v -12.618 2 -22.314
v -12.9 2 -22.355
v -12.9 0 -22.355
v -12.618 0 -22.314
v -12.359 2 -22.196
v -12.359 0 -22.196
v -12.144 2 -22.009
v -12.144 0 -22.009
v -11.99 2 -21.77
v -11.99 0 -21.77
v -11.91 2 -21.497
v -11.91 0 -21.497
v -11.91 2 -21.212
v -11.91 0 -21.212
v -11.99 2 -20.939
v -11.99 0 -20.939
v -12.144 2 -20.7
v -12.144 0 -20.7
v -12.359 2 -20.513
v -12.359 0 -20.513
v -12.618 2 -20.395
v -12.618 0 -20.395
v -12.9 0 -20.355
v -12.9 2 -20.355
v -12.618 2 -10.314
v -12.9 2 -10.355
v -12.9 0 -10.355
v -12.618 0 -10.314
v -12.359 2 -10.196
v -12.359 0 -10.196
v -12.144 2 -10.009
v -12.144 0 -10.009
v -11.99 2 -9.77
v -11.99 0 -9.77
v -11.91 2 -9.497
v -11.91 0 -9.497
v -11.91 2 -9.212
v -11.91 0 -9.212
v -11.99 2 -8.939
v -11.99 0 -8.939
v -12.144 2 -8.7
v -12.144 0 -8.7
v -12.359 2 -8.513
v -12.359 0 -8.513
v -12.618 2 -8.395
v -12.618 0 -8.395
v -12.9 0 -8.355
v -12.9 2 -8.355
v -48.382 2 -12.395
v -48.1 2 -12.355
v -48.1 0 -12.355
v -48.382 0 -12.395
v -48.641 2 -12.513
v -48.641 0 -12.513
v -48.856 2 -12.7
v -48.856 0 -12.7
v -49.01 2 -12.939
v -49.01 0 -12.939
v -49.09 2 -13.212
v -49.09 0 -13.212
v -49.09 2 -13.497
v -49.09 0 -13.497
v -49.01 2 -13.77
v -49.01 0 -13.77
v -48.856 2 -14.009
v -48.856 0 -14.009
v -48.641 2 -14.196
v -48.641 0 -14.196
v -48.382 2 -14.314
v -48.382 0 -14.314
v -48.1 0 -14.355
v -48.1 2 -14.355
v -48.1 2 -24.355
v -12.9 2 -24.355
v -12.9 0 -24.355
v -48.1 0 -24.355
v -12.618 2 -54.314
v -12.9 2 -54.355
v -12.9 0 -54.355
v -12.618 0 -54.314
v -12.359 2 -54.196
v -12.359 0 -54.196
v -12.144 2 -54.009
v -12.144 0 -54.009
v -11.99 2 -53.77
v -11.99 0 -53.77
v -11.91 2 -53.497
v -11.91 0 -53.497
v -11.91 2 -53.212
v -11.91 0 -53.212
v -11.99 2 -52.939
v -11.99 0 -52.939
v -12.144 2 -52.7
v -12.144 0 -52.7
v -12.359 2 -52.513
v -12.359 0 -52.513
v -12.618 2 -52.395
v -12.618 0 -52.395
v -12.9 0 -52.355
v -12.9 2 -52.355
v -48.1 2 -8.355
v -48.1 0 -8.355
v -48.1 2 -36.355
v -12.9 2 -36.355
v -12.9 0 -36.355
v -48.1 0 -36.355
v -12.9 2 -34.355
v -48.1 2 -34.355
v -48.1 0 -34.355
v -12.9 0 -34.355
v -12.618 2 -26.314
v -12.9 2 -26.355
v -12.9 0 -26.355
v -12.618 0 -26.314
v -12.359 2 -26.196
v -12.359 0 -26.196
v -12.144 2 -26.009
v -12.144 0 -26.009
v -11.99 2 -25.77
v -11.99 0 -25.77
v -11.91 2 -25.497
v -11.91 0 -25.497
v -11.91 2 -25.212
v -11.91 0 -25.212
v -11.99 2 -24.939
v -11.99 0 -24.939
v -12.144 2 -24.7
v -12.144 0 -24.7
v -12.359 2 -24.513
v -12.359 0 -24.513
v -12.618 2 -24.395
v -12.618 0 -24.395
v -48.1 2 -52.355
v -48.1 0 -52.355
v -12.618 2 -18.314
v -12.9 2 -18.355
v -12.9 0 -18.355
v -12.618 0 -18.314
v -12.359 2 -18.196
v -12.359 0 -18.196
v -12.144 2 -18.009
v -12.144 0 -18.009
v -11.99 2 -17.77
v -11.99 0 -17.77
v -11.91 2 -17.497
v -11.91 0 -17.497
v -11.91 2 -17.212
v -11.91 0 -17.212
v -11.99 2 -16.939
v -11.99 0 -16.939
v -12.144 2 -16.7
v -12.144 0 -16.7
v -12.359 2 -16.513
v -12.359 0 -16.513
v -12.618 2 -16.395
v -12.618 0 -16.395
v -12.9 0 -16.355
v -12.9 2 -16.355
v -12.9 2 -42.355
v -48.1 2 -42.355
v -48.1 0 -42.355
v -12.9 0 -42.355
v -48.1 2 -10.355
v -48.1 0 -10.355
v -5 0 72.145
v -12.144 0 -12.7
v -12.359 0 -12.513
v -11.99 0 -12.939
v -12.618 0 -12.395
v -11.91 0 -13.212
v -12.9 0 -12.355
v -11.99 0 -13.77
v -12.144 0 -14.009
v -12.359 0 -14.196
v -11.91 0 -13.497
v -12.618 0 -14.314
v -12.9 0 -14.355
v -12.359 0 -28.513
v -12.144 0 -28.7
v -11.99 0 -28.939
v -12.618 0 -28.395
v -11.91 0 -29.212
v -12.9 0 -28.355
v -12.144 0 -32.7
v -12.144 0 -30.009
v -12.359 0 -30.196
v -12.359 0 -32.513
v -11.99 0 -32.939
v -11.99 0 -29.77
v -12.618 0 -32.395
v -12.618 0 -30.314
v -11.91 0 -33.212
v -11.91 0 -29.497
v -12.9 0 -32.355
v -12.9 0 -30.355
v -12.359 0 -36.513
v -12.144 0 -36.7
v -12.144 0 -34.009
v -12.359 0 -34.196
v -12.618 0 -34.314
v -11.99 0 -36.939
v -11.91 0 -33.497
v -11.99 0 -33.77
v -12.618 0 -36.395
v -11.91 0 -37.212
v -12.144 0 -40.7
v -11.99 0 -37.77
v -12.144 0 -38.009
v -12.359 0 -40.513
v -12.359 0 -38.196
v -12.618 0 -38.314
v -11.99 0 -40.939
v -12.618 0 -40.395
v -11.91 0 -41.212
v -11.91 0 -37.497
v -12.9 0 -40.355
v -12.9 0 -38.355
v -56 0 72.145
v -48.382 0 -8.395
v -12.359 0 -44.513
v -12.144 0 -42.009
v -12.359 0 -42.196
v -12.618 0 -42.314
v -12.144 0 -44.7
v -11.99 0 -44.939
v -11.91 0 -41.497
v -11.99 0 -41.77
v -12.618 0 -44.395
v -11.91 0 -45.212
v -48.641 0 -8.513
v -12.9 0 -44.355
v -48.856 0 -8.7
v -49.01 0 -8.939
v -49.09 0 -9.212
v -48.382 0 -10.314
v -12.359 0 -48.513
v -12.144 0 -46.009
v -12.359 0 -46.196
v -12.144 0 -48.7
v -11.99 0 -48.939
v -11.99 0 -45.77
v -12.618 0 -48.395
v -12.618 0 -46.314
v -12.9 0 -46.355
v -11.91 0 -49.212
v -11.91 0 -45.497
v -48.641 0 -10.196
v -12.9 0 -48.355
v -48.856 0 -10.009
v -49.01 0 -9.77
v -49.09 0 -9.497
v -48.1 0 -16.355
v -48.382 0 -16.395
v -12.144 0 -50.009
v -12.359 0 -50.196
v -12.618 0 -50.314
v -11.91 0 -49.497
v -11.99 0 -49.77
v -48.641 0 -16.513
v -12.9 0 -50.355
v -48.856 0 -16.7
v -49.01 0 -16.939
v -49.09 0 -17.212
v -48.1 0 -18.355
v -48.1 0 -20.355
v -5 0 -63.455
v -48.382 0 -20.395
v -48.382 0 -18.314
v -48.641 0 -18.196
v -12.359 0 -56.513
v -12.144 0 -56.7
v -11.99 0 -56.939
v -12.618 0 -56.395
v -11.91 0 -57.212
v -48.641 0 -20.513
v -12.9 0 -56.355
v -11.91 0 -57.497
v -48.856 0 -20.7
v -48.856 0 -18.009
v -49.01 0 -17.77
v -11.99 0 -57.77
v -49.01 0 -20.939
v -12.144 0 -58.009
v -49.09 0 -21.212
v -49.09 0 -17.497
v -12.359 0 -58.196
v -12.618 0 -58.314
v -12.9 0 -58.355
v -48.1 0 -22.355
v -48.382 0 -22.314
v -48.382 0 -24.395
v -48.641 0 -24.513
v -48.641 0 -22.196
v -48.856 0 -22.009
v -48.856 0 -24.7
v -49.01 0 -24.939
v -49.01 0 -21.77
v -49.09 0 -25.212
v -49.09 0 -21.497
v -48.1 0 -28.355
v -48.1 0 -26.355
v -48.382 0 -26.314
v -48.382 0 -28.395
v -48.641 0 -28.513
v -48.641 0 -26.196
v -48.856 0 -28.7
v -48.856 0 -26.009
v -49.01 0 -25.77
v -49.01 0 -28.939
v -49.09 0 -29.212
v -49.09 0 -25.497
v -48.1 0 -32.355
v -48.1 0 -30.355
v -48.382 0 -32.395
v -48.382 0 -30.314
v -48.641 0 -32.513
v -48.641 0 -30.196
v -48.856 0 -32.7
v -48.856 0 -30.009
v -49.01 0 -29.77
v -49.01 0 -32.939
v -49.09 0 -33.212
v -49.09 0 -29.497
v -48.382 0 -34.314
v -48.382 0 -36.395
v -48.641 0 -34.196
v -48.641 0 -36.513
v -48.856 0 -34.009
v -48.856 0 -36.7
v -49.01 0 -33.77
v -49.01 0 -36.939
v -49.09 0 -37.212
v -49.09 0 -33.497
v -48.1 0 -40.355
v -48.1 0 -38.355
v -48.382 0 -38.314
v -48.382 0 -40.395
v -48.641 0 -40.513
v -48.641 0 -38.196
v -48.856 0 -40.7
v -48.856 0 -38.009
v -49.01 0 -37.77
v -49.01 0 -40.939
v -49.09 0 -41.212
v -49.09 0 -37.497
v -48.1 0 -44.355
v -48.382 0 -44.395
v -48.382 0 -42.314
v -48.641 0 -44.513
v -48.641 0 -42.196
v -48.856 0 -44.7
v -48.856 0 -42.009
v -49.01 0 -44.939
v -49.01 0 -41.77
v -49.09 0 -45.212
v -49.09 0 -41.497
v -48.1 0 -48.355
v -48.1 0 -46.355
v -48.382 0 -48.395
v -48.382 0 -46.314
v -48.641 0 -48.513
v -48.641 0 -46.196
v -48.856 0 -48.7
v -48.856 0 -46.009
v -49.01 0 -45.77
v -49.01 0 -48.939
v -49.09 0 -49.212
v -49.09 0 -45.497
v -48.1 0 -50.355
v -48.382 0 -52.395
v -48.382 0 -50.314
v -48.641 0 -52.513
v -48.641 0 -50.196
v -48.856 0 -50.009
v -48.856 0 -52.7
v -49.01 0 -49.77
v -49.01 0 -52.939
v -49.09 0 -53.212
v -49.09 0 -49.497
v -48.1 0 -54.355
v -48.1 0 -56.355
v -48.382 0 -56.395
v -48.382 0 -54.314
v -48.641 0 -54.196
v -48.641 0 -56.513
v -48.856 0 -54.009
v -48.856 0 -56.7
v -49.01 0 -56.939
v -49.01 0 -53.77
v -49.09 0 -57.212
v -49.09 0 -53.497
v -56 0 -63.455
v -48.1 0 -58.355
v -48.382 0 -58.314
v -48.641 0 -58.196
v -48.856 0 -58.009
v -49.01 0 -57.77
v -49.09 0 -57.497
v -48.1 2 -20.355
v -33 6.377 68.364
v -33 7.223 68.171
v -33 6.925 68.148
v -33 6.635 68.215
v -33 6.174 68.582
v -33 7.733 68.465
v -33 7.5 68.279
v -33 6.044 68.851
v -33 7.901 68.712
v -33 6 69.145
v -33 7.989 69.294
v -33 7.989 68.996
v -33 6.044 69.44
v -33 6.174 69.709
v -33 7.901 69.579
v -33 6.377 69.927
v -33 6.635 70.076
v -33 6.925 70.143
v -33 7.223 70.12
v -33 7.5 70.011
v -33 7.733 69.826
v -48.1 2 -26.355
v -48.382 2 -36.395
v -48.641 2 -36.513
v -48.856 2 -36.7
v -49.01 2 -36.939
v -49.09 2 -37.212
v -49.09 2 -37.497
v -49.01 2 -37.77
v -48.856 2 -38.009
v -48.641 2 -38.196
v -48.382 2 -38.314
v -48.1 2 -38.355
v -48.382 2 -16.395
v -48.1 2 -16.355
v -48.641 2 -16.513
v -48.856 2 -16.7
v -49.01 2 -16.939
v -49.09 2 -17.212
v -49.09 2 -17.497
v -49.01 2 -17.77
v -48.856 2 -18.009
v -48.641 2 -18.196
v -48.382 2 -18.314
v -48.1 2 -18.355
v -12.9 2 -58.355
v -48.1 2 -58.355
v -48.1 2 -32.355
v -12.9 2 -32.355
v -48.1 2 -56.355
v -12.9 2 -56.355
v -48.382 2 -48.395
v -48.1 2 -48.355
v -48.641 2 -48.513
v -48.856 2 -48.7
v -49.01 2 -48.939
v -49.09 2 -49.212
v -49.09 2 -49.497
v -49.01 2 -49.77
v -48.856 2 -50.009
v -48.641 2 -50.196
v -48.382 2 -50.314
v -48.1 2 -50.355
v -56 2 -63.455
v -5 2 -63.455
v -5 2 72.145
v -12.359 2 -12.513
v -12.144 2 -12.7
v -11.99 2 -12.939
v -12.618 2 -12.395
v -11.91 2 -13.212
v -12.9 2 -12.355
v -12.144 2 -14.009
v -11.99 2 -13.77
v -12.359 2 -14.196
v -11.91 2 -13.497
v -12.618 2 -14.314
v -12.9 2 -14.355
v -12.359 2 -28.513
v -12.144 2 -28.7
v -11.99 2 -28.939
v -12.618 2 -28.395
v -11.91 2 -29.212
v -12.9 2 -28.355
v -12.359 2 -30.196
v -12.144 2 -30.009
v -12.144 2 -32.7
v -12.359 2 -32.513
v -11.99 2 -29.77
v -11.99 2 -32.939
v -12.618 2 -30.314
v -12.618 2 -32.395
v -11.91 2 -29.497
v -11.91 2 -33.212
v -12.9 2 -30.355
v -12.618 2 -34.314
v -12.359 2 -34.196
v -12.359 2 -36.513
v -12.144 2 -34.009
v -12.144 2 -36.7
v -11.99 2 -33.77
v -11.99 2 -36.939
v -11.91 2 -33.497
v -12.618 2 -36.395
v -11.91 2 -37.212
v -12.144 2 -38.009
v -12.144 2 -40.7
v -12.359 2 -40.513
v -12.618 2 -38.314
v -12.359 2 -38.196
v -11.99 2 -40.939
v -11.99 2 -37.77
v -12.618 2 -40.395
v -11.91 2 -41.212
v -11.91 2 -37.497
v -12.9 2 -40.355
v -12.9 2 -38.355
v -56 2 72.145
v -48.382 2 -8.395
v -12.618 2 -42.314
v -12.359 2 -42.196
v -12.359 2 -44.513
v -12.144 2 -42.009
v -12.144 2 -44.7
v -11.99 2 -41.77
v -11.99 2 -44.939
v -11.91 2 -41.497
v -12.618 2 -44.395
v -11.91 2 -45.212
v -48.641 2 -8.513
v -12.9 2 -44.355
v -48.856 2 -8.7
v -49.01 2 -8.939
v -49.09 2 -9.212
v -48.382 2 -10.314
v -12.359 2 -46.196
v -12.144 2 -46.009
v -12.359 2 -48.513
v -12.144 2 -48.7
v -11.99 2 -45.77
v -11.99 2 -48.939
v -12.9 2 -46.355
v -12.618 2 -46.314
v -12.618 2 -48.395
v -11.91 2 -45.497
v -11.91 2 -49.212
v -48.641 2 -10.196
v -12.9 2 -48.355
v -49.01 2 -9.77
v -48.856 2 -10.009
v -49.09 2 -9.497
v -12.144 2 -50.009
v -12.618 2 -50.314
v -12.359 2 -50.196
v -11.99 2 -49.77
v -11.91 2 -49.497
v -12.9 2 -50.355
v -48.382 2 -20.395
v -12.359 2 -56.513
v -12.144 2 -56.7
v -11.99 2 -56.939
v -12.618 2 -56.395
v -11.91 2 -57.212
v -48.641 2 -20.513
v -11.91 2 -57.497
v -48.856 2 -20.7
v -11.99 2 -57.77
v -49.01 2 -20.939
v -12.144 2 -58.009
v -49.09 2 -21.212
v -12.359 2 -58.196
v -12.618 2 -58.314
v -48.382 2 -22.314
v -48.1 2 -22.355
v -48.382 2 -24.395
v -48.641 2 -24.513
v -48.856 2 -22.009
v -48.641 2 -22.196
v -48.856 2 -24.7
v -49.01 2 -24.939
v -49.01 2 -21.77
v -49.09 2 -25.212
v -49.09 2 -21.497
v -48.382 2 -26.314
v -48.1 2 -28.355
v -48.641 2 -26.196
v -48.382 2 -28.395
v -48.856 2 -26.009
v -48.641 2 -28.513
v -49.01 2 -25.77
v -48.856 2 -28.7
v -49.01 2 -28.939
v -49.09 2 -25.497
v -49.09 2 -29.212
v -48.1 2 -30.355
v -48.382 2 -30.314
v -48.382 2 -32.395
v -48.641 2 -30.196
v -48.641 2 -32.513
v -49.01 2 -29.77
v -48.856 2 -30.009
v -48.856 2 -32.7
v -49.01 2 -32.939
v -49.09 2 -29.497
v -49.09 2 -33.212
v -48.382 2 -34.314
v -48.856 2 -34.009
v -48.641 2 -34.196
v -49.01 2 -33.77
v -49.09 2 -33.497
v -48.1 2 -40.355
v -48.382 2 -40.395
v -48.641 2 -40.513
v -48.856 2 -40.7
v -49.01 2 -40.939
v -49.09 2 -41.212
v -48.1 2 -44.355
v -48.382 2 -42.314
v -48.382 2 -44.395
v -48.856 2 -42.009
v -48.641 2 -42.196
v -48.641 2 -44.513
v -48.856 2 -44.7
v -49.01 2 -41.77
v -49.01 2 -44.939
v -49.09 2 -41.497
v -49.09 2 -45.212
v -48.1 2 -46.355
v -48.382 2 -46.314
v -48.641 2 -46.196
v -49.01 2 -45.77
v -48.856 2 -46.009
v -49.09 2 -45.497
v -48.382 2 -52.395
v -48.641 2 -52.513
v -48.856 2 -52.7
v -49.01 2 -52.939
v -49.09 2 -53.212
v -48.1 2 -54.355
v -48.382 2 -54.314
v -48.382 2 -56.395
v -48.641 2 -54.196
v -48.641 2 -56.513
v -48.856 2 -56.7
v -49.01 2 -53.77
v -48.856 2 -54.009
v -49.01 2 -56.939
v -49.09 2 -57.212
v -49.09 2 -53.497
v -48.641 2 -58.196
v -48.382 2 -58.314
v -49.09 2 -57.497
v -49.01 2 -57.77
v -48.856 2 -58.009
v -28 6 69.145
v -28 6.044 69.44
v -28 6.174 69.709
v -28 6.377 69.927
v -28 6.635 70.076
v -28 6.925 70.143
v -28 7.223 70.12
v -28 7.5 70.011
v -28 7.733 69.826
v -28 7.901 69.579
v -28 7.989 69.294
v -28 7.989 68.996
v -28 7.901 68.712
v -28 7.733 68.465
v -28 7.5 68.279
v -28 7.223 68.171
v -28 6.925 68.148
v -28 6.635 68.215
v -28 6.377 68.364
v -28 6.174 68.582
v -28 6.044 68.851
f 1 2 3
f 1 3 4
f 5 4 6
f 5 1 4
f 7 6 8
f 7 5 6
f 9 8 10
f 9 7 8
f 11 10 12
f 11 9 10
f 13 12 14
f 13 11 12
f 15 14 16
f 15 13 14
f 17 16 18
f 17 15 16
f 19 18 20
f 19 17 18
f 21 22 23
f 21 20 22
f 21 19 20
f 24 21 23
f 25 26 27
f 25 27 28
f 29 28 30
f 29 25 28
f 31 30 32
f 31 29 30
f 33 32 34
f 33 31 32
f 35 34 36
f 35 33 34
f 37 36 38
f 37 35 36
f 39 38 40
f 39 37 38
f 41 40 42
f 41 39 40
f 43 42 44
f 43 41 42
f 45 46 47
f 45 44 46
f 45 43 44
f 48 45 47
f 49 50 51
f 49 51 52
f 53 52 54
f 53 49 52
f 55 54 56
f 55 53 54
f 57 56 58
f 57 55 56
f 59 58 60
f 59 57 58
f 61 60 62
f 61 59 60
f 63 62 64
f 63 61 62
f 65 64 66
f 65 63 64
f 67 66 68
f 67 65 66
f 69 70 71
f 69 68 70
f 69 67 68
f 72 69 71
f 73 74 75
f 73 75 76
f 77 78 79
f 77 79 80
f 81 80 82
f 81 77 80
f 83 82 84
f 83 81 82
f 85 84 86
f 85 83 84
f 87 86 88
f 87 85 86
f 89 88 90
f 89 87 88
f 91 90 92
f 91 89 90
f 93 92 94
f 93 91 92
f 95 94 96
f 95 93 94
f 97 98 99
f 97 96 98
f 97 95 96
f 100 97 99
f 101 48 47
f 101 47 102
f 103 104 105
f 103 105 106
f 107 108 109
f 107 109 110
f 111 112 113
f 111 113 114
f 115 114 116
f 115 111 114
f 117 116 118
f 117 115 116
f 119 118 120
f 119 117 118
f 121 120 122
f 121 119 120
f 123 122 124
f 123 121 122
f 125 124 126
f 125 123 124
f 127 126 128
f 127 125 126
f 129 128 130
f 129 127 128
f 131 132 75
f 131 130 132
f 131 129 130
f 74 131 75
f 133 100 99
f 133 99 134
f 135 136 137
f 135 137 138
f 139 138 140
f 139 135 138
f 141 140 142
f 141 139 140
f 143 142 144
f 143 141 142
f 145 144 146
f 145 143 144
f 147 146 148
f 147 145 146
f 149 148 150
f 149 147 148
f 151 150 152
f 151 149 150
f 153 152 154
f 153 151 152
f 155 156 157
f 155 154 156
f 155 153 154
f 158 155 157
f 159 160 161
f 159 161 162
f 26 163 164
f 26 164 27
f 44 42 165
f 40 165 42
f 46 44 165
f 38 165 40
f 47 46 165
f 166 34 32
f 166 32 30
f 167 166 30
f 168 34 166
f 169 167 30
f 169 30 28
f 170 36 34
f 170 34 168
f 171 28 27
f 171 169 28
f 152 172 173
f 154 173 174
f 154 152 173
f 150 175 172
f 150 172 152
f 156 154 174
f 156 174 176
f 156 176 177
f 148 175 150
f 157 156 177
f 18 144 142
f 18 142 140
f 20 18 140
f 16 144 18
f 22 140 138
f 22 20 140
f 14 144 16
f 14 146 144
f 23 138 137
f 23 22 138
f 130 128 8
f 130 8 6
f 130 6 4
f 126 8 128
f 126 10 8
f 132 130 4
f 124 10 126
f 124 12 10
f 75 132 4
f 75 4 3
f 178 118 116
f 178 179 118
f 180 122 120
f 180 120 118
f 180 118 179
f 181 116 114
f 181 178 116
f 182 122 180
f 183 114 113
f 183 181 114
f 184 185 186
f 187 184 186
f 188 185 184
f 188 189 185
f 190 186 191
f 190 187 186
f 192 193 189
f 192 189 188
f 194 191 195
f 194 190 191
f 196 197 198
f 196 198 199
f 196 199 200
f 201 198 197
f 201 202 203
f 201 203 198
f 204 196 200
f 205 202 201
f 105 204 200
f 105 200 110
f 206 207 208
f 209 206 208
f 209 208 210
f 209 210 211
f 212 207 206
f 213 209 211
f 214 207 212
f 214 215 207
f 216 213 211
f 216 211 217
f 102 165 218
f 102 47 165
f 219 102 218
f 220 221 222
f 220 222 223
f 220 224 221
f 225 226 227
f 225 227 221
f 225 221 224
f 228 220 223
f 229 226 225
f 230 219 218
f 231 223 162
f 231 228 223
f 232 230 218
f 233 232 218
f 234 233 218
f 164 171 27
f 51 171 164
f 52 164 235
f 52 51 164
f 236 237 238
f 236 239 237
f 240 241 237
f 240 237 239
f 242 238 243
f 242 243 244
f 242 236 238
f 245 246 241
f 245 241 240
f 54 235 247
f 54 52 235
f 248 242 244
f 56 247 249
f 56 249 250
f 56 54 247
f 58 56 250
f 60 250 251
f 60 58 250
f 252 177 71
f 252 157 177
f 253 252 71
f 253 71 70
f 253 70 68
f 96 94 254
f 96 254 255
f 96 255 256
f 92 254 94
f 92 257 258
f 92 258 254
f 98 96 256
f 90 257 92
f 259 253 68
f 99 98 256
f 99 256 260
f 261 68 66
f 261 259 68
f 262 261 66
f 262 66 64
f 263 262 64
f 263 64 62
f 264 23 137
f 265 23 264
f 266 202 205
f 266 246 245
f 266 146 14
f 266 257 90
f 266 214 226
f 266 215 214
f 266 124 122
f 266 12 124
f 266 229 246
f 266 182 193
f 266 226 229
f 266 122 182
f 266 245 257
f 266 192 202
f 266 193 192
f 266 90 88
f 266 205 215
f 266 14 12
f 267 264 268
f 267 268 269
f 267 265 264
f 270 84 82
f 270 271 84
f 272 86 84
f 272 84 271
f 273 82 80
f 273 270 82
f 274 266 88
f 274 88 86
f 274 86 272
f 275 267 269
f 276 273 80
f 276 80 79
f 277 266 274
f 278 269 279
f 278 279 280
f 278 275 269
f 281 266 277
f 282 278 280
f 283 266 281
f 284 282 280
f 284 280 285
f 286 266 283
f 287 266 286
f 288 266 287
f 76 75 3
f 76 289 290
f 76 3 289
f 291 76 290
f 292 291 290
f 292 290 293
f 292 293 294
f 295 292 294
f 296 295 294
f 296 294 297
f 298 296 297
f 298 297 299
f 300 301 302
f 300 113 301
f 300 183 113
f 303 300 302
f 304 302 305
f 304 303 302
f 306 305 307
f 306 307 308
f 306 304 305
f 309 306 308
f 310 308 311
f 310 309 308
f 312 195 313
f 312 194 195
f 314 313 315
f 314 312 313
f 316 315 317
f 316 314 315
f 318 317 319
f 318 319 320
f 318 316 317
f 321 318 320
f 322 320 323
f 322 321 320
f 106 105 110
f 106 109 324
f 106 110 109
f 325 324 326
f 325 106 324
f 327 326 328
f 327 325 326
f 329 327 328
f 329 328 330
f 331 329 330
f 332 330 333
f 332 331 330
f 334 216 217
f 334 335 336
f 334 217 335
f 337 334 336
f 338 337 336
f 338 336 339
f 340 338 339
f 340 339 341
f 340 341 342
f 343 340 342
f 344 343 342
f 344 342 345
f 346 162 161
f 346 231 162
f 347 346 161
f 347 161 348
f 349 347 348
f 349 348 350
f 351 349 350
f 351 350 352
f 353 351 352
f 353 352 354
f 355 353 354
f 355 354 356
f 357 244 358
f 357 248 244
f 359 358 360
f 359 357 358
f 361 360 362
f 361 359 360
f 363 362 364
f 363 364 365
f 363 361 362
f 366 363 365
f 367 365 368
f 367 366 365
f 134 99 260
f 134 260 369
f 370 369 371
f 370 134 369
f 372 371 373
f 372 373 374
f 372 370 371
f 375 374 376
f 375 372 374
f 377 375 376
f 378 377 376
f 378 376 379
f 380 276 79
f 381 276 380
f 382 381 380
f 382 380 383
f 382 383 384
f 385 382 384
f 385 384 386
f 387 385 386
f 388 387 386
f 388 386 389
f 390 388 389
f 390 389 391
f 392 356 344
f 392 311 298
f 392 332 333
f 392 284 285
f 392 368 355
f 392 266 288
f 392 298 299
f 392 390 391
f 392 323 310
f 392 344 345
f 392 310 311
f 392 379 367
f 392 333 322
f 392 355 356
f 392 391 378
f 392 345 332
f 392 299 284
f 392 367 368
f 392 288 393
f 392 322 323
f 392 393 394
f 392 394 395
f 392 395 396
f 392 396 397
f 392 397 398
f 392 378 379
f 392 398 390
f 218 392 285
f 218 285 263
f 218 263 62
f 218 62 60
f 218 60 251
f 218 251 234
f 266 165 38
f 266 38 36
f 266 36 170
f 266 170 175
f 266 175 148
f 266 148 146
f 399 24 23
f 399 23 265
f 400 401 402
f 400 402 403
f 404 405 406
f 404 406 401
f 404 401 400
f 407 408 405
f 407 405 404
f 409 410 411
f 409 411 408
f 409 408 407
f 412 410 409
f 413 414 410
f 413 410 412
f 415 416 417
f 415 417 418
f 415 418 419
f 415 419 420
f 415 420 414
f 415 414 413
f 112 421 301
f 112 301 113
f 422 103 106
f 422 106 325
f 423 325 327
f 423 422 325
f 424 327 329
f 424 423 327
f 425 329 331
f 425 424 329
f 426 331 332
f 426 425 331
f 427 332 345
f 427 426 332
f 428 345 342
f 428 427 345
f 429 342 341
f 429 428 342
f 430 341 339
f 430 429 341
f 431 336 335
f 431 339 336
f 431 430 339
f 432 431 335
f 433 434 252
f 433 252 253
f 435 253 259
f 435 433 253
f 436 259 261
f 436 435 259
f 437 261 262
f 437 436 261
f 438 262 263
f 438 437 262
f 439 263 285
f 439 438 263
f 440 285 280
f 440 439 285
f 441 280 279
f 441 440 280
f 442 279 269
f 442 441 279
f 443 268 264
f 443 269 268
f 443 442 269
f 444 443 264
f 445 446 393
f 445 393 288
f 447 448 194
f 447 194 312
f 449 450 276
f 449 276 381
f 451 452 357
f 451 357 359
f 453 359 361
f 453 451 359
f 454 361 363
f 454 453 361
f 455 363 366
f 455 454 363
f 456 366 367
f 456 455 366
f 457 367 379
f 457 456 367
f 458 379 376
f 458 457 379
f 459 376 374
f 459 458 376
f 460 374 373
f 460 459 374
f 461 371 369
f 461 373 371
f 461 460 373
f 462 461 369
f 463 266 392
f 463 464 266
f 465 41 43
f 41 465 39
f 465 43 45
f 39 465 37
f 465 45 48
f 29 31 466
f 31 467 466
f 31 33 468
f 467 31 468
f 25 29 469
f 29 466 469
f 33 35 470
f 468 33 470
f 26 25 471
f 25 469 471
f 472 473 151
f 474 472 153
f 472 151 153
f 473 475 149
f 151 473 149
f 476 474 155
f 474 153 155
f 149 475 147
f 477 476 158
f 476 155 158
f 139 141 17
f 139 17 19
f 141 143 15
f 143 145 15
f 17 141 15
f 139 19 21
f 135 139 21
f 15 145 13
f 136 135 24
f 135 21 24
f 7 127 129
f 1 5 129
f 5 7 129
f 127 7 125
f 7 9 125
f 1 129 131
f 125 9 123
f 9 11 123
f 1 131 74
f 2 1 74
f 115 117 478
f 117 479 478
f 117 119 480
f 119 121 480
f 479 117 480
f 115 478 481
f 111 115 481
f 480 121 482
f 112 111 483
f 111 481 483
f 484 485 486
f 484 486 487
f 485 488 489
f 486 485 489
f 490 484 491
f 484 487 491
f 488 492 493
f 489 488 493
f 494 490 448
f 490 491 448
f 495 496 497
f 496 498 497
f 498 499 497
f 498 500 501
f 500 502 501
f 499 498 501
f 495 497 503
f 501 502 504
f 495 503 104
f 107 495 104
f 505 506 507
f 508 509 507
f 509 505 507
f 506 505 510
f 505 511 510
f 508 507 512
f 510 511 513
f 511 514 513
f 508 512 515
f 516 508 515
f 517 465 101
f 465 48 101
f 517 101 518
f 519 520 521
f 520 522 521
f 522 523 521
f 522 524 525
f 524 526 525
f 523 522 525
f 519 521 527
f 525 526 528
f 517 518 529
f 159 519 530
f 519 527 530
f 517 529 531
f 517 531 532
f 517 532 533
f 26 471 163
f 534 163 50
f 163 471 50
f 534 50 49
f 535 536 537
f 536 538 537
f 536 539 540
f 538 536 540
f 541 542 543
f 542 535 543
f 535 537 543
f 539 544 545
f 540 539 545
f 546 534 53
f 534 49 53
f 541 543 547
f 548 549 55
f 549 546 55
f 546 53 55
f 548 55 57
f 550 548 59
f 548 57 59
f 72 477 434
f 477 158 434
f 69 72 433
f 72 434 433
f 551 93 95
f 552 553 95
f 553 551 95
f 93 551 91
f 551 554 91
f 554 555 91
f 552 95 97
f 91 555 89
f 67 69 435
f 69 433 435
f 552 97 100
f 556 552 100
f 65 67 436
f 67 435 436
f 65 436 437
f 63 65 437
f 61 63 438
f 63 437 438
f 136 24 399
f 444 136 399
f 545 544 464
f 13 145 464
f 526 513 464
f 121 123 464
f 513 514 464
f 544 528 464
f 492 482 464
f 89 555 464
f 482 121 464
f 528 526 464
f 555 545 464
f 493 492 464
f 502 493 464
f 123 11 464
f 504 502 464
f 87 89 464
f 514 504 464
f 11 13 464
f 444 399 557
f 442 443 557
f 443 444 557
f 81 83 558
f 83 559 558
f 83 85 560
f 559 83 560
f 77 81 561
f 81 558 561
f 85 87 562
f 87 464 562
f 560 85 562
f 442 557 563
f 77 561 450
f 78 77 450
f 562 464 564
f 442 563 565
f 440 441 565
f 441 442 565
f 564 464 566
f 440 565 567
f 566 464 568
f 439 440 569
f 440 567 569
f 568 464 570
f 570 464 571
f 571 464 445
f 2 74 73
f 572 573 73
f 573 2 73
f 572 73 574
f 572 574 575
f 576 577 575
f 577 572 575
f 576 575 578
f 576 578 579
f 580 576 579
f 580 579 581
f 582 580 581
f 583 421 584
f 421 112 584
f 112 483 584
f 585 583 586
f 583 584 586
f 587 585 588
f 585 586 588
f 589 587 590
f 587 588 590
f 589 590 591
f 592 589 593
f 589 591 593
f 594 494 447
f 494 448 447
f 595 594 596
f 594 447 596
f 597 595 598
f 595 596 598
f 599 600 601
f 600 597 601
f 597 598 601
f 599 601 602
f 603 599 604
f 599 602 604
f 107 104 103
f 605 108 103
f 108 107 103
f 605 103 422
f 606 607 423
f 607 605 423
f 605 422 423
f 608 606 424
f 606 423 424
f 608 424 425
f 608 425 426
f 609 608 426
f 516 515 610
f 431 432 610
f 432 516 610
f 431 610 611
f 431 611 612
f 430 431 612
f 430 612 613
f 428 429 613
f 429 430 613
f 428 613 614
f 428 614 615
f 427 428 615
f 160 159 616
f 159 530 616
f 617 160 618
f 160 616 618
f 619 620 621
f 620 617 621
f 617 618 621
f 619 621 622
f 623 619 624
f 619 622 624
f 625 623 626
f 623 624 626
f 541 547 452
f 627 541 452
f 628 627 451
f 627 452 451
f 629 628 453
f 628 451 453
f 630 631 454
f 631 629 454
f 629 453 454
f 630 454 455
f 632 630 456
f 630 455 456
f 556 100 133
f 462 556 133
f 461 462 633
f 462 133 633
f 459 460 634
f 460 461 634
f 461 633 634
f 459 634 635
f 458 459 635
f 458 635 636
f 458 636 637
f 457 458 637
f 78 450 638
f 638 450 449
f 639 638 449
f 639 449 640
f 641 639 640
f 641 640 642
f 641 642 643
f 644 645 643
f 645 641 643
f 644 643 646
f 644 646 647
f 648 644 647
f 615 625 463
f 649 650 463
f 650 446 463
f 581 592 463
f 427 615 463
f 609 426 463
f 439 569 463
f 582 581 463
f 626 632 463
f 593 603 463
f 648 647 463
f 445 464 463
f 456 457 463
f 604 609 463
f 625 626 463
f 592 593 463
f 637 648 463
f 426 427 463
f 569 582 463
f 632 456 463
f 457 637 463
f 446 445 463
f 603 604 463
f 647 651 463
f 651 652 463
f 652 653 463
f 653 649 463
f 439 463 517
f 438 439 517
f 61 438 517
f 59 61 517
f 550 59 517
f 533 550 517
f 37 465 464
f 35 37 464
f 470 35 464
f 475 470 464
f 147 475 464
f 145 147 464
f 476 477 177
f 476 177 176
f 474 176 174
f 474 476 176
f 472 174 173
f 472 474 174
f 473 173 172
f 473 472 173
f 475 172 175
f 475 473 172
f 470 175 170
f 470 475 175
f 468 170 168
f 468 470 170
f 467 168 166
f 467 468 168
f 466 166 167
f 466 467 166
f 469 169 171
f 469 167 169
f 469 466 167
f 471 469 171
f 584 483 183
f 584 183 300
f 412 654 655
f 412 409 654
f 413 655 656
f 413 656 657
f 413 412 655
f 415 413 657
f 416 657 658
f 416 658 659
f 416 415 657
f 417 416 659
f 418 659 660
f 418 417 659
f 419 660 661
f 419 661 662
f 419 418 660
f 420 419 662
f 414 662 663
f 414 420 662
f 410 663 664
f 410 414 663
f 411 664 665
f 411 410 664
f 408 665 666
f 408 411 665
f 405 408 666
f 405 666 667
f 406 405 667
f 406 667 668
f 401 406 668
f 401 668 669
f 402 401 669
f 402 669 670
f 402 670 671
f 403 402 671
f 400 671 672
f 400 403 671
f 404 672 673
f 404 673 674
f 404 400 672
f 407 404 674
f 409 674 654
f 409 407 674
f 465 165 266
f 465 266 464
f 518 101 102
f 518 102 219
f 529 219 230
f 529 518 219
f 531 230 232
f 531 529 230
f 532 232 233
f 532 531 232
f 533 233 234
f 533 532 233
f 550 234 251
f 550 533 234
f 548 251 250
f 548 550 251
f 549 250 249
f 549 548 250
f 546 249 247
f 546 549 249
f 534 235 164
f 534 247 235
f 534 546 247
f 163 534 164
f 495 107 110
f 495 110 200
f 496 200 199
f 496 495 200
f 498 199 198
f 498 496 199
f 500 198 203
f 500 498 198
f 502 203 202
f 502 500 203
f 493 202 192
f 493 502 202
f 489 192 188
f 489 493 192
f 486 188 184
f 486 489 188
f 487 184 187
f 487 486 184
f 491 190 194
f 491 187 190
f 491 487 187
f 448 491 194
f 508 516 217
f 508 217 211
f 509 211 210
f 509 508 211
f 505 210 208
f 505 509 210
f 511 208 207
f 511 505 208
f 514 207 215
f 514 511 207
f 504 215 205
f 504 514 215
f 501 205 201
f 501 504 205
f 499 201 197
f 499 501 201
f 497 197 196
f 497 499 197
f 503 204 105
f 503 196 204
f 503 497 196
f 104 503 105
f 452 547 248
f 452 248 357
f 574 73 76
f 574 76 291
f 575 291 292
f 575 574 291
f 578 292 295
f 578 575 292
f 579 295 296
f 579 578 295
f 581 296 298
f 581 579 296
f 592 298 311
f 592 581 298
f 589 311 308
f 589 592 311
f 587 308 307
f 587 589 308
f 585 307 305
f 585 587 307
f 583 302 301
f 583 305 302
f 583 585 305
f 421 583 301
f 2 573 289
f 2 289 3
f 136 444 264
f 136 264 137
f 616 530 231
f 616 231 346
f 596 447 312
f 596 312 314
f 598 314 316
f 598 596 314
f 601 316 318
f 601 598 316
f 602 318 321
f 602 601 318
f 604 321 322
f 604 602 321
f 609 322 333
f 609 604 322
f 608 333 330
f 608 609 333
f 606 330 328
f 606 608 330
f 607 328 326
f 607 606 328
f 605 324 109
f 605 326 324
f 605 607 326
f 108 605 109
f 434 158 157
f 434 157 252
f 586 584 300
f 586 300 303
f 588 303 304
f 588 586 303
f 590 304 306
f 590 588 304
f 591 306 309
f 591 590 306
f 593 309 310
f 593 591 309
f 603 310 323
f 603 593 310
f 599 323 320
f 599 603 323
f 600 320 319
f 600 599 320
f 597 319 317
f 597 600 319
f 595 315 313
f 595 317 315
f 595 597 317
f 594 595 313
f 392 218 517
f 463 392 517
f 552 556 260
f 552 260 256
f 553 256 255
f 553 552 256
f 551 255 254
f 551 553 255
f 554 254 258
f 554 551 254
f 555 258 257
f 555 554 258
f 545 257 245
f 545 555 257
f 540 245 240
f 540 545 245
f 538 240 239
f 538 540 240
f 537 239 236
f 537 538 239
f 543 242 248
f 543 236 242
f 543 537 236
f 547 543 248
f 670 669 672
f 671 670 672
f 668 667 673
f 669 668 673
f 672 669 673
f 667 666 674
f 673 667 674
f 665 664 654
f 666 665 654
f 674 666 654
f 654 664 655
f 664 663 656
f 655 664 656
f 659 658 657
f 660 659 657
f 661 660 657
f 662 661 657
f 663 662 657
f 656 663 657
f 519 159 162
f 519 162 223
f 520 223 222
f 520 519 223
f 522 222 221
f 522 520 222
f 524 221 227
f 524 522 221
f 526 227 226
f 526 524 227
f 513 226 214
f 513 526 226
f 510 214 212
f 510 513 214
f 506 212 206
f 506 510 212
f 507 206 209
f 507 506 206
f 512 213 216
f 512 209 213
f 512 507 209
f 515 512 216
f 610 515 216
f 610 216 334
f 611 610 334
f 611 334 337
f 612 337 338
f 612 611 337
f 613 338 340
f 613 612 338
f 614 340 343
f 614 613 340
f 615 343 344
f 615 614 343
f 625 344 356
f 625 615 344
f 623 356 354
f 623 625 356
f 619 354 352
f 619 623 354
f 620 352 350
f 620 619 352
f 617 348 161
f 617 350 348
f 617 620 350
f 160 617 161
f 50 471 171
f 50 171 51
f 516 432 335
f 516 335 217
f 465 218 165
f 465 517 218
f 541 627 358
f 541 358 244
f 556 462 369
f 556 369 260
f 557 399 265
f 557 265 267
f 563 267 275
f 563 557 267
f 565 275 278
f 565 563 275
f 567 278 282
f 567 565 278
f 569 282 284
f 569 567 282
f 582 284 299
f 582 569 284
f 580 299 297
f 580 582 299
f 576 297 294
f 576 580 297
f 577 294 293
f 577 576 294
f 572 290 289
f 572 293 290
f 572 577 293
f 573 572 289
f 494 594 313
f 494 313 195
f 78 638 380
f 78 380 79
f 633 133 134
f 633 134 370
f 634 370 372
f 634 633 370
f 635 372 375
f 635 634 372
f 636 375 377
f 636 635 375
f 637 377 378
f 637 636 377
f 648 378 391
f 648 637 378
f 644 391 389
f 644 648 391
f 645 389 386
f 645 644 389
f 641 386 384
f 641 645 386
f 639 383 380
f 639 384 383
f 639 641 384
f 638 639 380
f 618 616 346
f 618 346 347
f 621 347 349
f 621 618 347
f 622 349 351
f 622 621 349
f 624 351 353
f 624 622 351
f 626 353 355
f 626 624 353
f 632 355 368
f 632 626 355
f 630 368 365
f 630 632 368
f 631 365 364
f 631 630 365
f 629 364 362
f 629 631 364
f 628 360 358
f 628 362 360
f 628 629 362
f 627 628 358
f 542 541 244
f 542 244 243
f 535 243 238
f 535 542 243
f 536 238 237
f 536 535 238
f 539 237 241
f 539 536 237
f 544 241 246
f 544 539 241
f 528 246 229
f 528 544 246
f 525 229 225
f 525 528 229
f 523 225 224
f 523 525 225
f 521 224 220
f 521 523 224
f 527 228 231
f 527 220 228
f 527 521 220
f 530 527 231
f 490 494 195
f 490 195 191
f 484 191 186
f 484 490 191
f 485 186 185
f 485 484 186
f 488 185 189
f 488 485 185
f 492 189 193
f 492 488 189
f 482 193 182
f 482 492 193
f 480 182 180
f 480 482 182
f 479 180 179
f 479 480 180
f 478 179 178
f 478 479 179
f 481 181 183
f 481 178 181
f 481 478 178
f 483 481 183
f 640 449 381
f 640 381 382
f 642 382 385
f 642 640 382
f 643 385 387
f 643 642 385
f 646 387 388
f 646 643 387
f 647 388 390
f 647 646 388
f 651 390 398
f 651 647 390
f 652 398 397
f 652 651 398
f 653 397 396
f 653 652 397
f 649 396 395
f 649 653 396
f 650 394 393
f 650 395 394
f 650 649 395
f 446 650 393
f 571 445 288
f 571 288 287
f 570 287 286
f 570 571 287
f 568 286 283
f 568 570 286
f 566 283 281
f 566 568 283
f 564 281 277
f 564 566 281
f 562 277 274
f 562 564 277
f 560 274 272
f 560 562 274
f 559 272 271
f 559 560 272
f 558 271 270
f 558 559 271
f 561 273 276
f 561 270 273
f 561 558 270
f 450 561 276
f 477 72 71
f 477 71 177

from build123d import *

# Parameters (mm, degrees)
SKETCH1_W           = 51
SKETCH1_H           = 136
BOSS_EXTRUDE1_DEPTH = 2
CUT_EXTRUDE1_DEPTH  = 10
SKETCH5_W           = 1
SKETCH5_H           = 2
BOSS_EXTRUDE2_DEPTH = 136
SKETCH6_W           = 1
SKETCH6_H           = 2
BOSS_EXTRUDE3_DEPTH = 136
SKETCH7_W           = 68.795835126
SKETCH7_H           = 26.425628728
CUT_EXTRUDE2_DEPTH  = 0.4
SKETCH8_W           = 2
SKETCH8_H           = 2
CUT_EXTRUDE3_DEPTH  = 135.6
SKETCH9_R           = 1
BOSS_EXTRUDE4_DEPTH = 2.5


with BuildPart() as part:
    # Sketch1 → Boss-Extrude1 (new body)
    with BuildSketch(Plane(origin=(0, 0, 0), x_dir=(1, 0, 0), z_dir=(0, 1, 0))):
        with Locations((-30.5, -4.545454545)):
            Rectangle(SKETCH1_W, SKETCH1_H)
    extrude(amount=BOSS_EXTRUDE1_DEPTH)

    # Sketch4 → Cut-Extrude1 (cut)
    with BuildSketch(Plane(origin=(0, 2, 0), x_dir=(1, 0, 0), z_dir=(0, 1, 0))):
        with BuildLine():
            Line((-48.1, 58.354545455), (-12.9, 58.354545455))
            ThreePointArc((-12.9, 58.354545455), (-11.9, 57.354545455), (-12.9, 56.354545455))
            Line((-12.9, 56.354545455), (-48.1, 56.354545455))
            ThreePointArc((-48.1, 56.354545455), (-49.1, 57.354545455), (-48.1, 58.354545455))
        make_face()
        with BuildLine():
            Line((-48.1, 54.354545455), (-12.9, 54.354545455))
            ThreePointArc((-12.9, 54.354545455), (-11.9, 53.354545455), (-12.9, 52.354545455))
            Line((-12.9, 52.354545455), (-48.1, 52.354545455))
            ThreePointArc((-48.1, 52.354545455), (-49.1, 53.354545455), (-48.1, 54.354545455))
        make_face()
        with BuildLine():
            Line((-48.1, 50.354545455), (-12.9, 50.354545455))
            ThreePointArc((-12.9, 50.354545455), (-11.9, 49.354545455), (-12.9, 48.354545455))
            Line((-12.9, 48.354545455), (-48.1, 48.354545455))
            ThreePointArc((-48.1, 48.354545455), (-49.1, 49.354545455), (-48.1, 50.354545455))
        make_face()
        with BuildLine():
            Line((-48.1, 46.354545455), (-12.9, 46.354545455))
            ThreePointArc((-12.9, 46.354545455), (-11.9, 45.354545455), (-12.9, 44.354545455))
            Line((-12.9, 44.354545455), (-48.1, 44.354545455))
            ThreePointArc((-48.1, 44.354545455), (-49.1, 45.354545455), (-48.1, 46.354545455))
        make_face()
        with BuildLine():
            Line((-48.1, 42.354545455), (-12.9, 42.354545455))
            ThreePointArc((-12.9, 42.354545455), (-11.9, 41.354545455), (-12.9, 40.354545455))
            Line((-12.9, 40.354545455), (-48.1, 40.354545455))
            ThreePointArc((-48.1, 40.354545455), (-49.1, 41.354545455), (-48.1, 42.354545455))
        make_face()
        with BuildLine():
            Line((-48.1, 38.354545455), (-12.9, 38.354545455))
            ThreePointArc((-12.9, 38.354545455), (-11.9, 37.354545455), (-12.9, 36.354545455))
            Line((-12.9, 36.354545455), (-48.1, 36.354545455))
            ThreePointArc((-48.1, 36.354545455), (-49.1, 37.354545455), (-48.1, 38.354545455))
        make_face()
        with BuildLine():
            Line((-48.1, 34.354545455), (-12.9, 34.354545455))
            ThreePointArc((-12.9, 34.354545455), (-11.9, 33.354545455), (-12.9, 32.354545455))
            Line((-12.9, 32.354545455), (-48.1, 32.354545455))
            ThreePointArc((-48.1, 32.354545455), (-49.1, 33.354545455), (-48.1, 34.354545455))
        make_face()
        with BuildLine():
            Line((-48.1, 30.354545455), (-12.9, 30.354545455))
            ThreePointArc((-12.9, 30.354545455), (-11.9, 29.354545455), (-12.9, 28.354545455))
            Line((-12.9, 28.354545455), (-48.1, 28.354545455))
            ThreePointArc((-48.1, 28.354545455), (-49.1, 29.354545455), (-48.1, 30.354545455))
        make_face()
        with BuildLine():
            Line((-48.1, 26.354545455), (-12.9, 26.354545455))
            ThreePointArc((-12.9, 26.354545455), (-11.9, 25.354545455), (-12.9, 24.354545455))
            Line((-12.9, 24.354545455), (-48.1, 24.354545455))
            ThreePointArc((-48.1, 24.354545455), (-49.1, 25.354545455), (-48.1, 26.354545455))
        make_face()
        with BuildLine():
            Line((-48.1, 22.354545455), (-12.9, 22.354545455))
            ThreePointArc((-12.9, 22.354545455), (-11.9, 21.354545455), (-12.9, 20.354545455))
            Line((-12.9, 20.354545455), (-48.1, 20.354545455))
            ThreePointArc((-48.1, 20.354545455), (-49.1, 21.354545455), (-48.1, 22.354545455))
        make_face()
        with BuildLine():
            Line((-48.1, 18.354545455), (-12.9, 18.354545455))
            ThreePointArc((-12.9, 18.354545455), (-11.9, 17.354545455), (-12.9, 16.354545455))
            Line((-12.9, 16.354545455), (-48.1, 16.354545455))
            ThreePointArc((-48.1, 16.354545455), (-49.1, 17.354545455), (-48.1, 18.354545455))
        make_face()
        with BuildLine():
            Line((-48.1, 14.354545455), (-12.9, 14.354545455))
            ThreePointArc((-12.9, 14.354545455), (-11.9, 13.354545455), (-12.9, 12.354545455))
            Line((-12.9, 12.354545455), (-48.1, 12.354545455))
            ThreePointArc((-48.1, 12.354545455), (-49.1, 13.354545455), (-48.1, 14.354545455))
        make_face()
        with BuildLine():
            Line((-48.1, 10.354545455), (-12.9, 10.354545455))
            ThreePointArc((-12.9, 10.354545455), (-11.9, 9.354545455), (-12.9, 8.354545455))
            Line((-12.9, 8.354545455), (-48.1, 8.354545455))
            ThreePointArc((-48.1, 8.354545455), (-49.1, 9.354545455), (-48.1, 10.354545455))
        make_face()
    extrude(amount=-CUT_EXTRUDE1_DEPTH, mode=Mode.SUBTRACT)

    # Sketch5 → Boss-Extrude2 (add)
    with BuildSketch(Plane(origin=(0, 0, -63.454545455), x_dir=(-1, 0, 0), z_dir=(0, 0, -1))):
        with Locations((56.5, 1)):
            Rectangle(SKETCH5_W, SKETCH5_H)
        with Locations((4.5, 1)):
            Rectangle(SKETCH5_W, SKETCH5_H)
    extrude(amount=-BOSS_EXTRUDE2_DEPTH)

    # Sketch6 → Boss-Extrude3 (add)
    with BuildSketch(Plane(origin=(0, 0, -63.454545455), x_dir=(-1, 0, 0), z_dir=(0, 0, -1))):
        with Locations((57.5, 1)):
            Rectangle(SKETCH6_W, SKETCH6_H)
        with Locations((3.5, 1)):
            Rectangle(SKETCH6_W, SKETCH6_H)
    extrude(amount=-BOSS_EXTRUDE3_DEPTH)

    # Sketch7 → Cut-Extrude2 (cut)
    with BuildSketch(Plane.XY.offset(72.545454545)):
        with Locations((-32.339758962, -3.400766566)):
            Rectangle(SKETCH7_W, SKETCH7_H)
    extrude(amount=-CUT_EXTRUDE2_DEPTH, mode=Mode.SUBTRACT)

    # Sketch8 → Cut-Extrude3 (cut)
    with BuildSketch(Plane(origin=(0, 0, -63.454545455), x_dir=(-1, 0, 0), z_dir=(0, 0, -1))):
        with Locations((4, 1)):
            Rectangle(SKETCH8_W, SKETCH8_H)
        with Locations((57, 1)):
            Rectangle(SKETCH8_W, SKETCH8_H)
    extrude(amount=-CUT_EXTRUDE3_DEPTH, mode=Mode.SUBTRACT)


with BuildPart() as body_2:
    # Sketch9 → Boss-Extrude4 (new, symmetric)
    with BuildSketch(Plane.ZY.offset(30.5)):
        with Locations(Location((69.145454545, 7, 0), (0, 0, 270))):
            Circle(SKETCH9_R)
    extrude(amount=BOSS_EXTRUDE4_DEPTH, both=True)


solid = Compound([part.part, body_2.part])
